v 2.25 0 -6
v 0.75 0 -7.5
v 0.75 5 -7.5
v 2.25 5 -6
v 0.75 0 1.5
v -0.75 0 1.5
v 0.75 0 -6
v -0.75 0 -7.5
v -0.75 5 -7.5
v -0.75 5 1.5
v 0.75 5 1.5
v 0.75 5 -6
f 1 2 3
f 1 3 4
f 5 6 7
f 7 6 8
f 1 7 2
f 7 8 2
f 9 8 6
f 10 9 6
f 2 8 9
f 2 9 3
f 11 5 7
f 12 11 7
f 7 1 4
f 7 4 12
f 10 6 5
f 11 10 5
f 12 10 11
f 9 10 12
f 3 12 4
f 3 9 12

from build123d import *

# Parameters (mm, degrees)
SKETCH1_W           = 1.5
SKETCH1_H           = 3
BOSS_EXTRUDE1_DEPTH = 5


with BuildPart() as part:
    # Sketch1 → Boss-Extrude1 (new body)
    with BuildSketch(Plane(origin=(0, 0, 0), x_dir=(1, 0, 0), z_dir=(0, 1, 0))):
        Rectangle(SKETCH1_W, SKETCH1_H)
        Polygon((0.75, 6), (0.75, 1.5), (-0.75, 1.5), (-0.75, 7.5), (0.75, 7.5), (2.25, 6), align=None)
    extrude(amount=BOSS_EXTRUDE1_DEPTH)


solid = part.part
